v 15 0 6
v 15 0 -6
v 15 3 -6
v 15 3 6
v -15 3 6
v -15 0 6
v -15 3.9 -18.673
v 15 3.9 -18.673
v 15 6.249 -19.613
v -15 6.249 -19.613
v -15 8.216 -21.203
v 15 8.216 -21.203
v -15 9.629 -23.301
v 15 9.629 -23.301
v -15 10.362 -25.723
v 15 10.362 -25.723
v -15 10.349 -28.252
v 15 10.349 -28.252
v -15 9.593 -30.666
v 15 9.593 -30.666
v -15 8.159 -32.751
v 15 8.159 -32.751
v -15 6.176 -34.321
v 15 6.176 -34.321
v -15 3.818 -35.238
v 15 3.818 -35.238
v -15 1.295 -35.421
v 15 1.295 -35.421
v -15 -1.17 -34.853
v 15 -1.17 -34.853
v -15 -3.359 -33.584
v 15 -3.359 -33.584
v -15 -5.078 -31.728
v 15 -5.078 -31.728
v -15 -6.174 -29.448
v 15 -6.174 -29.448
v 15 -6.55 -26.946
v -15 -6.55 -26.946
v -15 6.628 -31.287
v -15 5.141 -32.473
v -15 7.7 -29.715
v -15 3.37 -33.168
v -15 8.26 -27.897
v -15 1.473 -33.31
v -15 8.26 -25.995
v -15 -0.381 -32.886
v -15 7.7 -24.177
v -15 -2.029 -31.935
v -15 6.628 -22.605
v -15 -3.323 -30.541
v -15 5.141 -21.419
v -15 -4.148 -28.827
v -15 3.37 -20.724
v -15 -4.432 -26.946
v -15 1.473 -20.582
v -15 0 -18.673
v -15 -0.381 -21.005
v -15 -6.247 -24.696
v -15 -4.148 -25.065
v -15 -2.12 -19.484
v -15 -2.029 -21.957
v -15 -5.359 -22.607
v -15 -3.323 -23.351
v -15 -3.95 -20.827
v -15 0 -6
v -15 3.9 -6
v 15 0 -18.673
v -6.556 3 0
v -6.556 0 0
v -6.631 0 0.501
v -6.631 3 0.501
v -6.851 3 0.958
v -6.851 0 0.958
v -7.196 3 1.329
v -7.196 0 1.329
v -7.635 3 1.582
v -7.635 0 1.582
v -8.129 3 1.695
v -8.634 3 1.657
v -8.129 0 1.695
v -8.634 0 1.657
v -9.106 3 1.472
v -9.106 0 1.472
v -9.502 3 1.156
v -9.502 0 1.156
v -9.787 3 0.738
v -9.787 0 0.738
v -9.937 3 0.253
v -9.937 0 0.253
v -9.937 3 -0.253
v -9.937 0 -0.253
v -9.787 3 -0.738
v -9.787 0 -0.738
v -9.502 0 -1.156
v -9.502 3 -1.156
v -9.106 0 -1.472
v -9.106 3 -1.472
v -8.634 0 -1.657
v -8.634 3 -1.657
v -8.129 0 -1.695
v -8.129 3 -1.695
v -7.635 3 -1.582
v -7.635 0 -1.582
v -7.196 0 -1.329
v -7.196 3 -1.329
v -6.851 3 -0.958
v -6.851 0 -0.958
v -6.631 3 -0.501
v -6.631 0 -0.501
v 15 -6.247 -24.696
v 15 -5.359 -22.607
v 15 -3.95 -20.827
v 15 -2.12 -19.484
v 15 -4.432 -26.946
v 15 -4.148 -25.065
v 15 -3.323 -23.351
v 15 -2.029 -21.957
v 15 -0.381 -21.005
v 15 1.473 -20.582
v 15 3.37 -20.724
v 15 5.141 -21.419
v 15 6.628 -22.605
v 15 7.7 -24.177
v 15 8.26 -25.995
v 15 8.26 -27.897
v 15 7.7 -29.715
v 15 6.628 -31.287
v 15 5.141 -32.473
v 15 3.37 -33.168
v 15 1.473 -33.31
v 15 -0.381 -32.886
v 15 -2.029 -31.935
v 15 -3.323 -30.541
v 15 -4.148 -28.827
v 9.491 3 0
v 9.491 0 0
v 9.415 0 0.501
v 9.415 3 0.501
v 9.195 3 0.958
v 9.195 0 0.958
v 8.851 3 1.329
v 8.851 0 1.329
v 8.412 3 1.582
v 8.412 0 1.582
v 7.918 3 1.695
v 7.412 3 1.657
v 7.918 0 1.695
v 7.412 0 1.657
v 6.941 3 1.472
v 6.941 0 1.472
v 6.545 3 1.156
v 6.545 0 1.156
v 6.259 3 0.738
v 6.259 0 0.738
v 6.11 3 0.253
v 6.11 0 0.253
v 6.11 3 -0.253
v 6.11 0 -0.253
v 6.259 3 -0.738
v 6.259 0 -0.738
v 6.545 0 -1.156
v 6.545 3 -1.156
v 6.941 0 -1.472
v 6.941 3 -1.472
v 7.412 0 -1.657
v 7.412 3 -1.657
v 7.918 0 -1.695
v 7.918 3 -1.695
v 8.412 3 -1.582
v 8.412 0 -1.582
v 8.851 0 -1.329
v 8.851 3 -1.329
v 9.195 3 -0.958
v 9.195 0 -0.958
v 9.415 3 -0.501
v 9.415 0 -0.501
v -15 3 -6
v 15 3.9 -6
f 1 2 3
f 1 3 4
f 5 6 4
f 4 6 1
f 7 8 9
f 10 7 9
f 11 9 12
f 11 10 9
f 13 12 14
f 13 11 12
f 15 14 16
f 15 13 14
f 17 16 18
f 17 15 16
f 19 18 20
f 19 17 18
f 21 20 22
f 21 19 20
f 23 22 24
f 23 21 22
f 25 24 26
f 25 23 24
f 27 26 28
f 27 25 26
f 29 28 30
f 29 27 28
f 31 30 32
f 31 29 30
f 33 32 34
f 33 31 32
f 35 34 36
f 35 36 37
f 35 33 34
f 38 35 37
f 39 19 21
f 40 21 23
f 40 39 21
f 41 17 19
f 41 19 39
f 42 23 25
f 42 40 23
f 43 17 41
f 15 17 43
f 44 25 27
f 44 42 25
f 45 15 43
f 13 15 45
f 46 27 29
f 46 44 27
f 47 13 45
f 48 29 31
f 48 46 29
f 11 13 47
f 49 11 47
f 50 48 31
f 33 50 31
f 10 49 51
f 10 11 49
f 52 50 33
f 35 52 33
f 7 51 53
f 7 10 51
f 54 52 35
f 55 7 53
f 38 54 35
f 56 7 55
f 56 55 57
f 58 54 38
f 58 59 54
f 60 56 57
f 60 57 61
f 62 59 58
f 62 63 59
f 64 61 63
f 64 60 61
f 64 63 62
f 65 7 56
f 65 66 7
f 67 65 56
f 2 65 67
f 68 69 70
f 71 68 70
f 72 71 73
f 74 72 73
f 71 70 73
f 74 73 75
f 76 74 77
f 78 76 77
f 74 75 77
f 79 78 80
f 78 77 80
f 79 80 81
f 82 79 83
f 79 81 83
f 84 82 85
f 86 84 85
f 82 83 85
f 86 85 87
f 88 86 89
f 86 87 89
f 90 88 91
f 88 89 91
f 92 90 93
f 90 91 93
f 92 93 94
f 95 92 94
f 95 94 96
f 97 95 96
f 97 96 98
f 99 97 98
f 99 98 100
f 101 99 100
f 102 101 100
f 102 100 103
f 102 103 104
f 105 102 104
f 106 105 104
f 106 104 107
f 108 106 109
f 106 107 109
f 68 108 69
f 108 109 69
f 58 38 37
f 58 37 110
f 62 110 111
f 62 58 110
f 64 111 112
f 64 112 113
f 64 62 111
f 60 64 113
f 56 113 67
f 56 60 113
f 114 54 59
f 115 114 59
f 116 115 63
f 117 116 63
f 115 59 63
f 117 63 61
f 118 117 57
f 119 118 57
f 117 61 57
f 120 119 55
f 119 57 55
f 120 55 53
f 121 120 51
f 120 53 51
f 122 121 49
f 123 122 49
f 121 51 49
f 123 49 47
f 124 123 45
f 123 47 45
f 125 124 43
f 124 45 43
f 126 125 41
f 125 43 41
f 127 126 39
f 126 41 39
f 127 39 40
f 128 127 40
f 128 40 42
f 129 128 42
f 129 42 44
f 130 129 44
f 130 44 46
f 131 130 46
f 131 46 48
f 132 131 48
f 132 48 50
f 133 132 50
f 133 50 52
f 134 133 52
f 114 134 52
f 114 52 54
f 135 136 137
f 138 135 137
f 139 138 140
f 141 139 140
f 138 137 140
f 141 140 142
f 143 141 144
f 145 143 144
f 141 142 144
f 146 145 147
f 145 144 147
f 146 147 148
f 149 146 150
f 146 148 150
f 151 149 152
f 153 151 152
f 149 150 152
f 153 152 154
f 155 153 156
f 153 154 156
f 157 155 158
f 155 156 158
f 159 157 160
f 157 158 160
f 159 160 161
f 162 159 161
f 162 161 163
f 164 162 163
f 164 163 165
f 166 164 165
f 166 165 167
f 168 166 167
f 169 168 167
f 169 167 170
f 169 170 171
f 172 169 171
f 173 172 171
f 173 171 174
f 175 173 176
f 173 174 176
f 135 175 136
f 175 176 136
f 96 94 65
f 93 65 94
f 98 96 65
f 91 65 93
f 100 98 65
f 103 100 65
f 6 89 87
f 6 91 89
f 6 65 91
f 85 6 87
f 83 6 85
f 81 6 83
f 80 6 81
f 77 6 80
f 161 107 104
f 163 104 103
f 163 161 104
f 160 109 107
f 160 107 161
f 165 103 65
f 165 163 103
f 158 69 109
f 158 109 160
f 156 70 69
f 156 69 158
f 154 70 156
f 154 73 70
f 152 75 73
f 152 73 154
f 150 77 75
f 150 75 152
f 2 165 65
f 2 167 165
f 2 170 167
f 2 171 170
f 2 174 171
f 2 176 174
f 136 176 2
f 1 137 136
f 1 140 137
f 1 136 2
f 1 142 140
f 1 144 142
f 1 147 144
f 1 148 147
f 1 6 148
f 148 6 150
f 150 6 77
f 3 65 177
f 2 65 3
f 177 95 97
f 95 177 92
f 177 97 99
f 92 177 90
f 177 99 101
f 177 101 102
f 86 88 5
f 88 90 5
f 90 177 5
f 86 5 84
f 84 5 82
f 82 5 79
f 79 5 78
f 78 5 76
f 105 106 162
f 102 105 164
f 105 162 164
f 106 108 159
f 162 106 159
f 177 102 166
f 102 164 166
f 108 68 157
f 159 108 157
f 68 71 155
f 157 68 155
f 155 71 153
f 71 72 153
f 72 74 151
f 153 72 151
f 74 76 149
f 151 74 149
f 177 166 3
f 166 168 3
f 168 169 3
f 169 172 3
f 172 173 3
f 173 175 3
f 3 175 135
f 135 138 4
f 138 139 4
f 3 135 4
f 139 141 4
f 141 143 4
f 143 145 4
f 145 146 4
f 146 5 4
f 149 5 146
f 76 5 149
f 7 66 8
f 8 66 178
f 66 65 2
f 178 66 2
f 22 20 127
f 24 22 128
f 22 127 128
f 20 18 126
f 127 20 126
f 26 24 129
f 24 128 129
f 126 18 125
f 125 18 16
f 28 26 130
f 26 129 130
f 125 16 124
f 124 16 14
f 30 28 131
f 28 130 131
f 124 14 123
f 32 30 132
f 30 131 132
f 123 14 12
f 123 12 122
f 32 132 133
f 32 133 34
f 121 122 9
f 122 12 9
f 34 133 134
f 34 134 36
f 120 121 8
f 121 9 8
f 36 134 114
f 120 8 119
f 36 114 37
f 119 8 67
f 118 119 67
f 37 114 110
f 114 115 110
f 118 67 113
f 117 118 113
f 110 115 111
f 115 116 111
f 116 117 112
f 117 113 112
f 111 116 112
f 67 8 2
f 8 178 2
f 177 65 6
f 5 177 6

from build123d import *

# Parameters (mm, degrees)
F0_W     = 30
F0_H     = 12
F0_R     = 1.7
F1_DEPTH = 3
F2_W     = 30
F2_H     = 15
F3_DEPTH = 3.9
F5_DEPTH = 30
F6_R     = 6.381665
F7_DEPTH = 30.001


with BuildPart() as f1:
    # F0 (on Front) → F1 (new body)
    with BuildSketch(Plane.XZ):
        Rectangle(F0_W, F0_H)
        with Locations((-8.255844, 0)):
            Circle(F0_R, mode=Mode.SUBTRACT)
        with Locations((7.790726, 0)):
            Circle(F0_R, mode=Mode.SUBTRACT)
    extrude(amount=-F1_DEPTH)


with BuildPart() as f3:
    # F2 (on Front) → F3 (new body)
    with BuildSketch(Plane.XZ):
        with Locations((0, -13.5)):
            Rectangle(F2_W, F2_H)
    extrude(amount=-F3_DEPTH)

    # F4 (on face) → F5 (join)
    with BuildSketch(Plane(origin=(-15, 0, 0), x_dir=(0, -1, 0), z_dir=(-1, 0, 0))):
        with BuildLine():
            ThreePointArc((-3.9, -18.67267), (-7.226125, -33.610241), (6.55, -26.945971))
            ThreePointArc((6.55, -26.945971), (4.71427, -21.669845), (0, -18.67267))
            Line((0, -18.67267), (0, -21))
            Line((0, -21), (-3.9, -21))
            Line((-3.9, -21), (-3.9, -18.67267))
        make_face()
    extrude(amount=-F5_DEPTH)

    # F6 (on face) → F7 (cut, through all)
    with BuildSketch(Plane(origin=(-15, 0, 0), x_dir=(0, -1, 0), z_dir=(-1, 0, 0))):
        with Locations((-1.95, -26.945971)):
            Circle(F6_R)
    extrude(amount=-F7_DEPTH, mode=Mode.SUBTRACT)


solid = Compound([f1.part, f3.part])
